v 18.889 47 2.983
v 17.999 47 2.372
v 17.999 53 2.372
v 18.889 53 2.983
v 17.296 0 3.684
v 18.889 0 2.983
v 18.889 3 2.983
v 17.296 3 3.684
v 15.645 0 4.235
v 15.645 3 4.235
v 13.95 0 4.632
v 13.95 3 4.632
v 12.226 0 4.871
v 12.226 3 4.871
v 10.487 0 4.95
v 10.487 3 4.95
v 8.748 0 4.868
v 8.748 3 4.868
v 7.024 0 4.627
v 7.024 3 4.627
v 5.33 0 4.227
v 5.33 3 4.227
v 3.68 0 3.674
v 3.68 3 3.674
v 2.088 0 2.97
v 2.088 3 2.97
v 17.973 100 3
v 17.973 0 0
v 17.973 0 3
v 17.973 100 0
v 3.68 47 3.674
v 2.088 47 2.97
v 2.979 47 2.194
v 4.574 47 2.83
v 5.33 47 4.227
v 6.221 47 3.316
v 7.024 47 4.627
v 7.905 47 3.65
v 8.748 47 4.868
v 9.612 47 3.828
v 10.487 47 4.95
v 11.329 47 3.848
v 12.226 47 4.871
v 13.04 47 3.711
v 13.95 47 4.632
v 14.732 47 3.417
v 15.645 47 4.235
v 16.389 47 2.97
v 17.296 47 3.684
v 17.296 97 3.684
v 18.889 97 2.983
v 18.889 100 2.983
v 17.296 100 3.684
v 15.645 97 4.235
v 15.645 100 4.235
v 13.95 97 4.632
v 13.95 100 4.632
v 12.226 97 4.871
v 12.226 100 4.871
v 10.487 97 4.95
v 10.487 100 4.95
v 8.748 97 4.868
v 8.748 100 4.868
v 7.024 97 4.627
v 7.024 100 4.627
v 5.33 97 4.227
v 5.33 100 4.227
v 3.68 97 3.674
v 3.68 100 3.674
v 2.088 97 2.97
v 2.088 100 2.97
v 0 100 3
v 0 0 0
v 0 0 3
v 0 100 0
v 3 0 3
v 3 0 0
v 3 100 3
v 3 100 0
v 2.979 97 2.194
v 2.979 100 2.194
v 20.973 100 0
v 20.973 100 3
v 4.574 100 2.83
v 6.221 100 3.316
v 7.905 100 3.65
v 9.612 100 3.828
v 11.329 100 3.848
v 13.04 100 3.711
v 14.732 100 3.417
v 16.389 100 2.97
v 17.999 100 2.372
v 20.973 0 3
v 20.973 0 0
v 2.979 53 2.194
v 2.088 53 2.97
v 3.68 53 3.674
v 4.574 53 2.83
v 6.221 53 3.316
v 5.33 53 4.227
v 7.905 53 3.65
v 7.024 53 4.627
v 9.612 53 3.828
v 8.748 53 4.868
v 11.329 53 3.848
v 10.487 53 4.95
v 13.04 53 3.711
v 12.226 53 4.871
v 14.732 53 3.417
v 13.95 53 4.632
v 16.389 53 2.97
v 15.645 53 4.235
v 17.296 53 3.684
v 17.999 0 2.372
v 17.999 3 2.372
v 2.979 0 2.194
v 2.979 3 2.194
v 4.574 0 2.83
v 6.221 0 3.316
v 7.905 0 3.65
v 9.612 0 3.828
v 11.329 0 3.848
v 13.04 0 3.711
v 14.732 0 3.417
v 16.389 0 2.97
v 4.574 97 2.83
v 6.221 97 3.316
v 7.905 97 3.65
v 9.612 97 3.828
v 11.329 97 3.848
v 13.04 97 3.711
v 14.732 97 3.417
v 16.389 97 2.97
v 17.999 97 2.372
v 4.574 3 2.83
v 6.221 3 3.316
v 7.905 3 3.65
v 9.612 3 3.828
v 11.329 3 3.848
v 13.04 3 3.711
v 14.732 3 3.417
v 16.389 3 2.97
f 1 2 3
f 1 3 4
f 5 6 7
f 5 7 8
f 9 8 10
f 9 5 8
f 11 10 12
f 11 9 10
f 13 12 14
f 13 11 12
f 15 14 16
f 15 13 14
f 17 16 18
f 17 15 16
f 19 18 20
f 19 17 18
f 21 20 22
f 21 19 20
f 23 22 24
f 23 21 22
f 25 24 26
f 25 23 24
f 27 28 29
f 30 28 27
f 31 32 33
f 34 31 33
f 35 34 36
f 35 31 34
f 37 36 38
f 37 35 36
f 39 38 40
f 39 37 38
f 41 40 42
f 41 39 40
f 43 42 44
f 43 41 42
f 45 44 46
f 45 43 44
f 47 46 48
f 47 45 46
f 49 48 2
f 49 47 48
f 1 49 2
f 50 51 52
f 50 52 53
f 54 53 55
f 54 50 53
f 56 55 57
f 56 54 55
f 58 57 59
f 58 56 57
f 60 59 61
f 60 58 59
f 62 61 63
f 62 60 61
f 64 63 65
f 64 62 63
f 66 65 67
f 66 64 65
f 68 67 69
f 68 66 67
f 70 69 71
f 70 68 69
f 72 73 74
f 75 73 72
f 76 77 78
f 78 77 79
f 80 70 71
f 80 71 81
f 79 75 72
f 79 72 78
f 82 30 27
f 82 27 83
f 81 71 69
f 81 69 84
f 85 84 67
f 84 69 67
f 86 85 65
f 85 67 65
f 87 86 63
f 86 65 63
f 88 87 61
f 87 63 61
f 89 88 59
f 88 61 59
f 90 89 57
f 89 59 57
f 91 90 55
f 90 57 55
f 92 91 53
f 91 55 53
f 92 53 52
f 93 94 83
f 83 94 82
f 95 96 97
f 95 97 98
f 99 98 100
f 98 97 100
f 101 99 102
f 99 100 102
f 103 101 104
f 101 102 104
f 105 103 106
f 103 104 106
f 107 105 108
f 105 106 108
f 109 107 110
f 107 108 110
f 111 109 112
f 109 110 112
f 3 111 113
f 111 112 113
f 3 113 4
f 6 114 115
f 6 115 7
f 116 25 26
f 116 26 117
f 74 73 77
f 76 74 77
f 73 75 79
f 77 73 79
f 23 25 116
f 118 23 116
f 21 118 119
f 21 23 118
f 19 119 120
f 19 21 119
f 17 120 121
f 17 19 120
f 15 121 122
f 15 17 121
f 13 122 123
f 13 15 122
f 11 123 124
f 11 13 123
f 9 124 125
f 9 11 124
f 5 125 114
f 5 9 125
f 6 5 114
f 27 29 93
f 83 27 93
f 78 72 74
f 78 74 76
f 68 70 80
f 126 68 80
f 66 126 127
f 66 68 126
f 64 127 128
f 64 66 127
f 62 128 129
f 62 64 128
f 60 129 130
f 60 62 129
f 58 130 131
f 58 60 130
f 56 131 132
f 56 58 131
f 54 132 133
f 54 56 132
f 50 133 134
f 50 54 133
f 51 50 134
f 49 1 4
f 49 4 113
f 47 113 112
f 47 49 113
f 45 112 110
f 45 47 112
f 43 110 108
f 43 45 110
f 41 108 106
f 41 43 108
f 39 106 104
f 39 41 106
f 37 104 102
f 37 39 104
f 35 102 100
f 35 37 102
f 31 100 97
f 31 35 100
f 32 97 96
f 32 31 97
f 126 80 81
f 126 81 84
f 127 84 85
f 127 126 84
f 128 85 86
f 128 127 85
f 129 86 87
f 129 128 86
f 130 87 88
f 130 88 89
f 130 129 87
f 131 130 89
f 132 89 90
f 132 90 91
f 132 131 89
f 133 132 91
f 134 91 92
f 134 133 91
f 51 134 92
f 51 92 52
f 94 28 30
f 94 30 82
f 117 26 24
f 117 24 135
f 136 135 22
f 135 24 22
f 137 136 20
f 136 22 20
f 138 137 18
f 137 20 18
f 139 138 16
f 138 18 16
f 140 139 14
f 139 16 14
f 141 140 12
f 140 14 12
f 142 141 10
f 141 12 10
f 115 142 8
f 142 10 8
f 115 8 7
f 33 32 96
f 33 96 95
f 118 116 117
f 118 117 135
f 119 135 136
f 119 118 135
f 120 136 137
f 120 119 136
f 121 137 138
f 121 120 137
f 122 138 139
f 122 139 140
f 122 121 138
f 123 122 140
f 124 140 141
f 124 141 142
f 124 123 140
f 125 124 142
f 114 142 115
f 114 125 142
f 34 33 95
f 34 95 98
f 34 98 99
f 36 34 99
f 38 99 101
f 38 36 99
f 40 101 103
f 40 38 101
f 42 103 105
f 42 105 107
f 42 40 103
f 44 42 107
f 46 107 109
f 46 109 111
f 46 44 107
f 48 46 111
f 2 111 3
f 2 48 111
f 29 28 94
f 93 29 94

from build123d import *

# Parameters (mm, degrees)
F0_W     = 3
F0_H     = 100
F1_DEPTH = 3
F3_DEPTH = 3
F4_START = -47
F4_DEPTH = 6
F5_START = -97
F5_DEPTH = 3


with BuildPart() as f1:
    # F0 (on Top) → F1 (new body)
    with BuildSketch(Plane.XY):
        with Locations((1.5, 50)):
            Rectangle(F0_W, F0_H)
    extrude(amount=F1_DEPTH)


with BuildPart() as f1b:
    # F0 (on Top) → F1, piece 2 (new body)
    with BuildSketch(Plane.XY):
        with Locations((19.4732441902, 50)):
            Rectangle(F0_W, F0_H)
    extrude(amount=F1_DEPTH)


with BuildPart() as f3:
    # F2 (on Front) → F3 (new body)
    with BuildSketch(Plane.XZ):
        with BuildLine():
            ThreePointArc((2.9794946313, 2.1942069288), (10.4704971824, 3.8575045035), (17.9987903684, 2.37208209))
            Line((17.9987903684, 2.37208209), (18.889406696, 2.9833931476))
            ThreePointArc((18.889406696, 2.9833931476), (10.4870498812, 4.9495737182), (2.087746514, 2.970389789))
            Line((2.087746514, 2.970389789), (2.9794946313, 2.1942069288))
        make_face()
    extrude(amount=-F3_DEPTH)


with BuildPart() as f4:
    # F2 (on Front) → F4 (new body)
    with BuildSketch(Plane.XZ.offset(F4_START)):
        with BuildLine():
            ThreePointArc((2.9794946313, 2.1942069288), (10.4704971824, 3.8575045035), (17.9987903684, 2.37208209))
            Line((17.9987903684, 2.37208209), (18.889406696, 2.9833931476))
            ThreePointArc((18.889406696, 2.9833931476), (10.4870498812, 4.9495737182), (2.087746514, 2.970389789))
            Line((2.087746514, 2.970389789), (2.9794946313, 2.1942069288))
        make_face()
    extrude(amount=-F4_DEPTH)


with BuildPart() as f5:
    # F2 (on Front) → F5 (new body)
    with BuildSketch(Plane.XZ.offset(F5_START)):
        with BuildLine():
            ThreePointArc((2.9794946313, 2.1942069288), (10.4704971824, 3.8575045035), (17.9987903684, 2.37208209))
            Line((17.9987903684, 2.37208209), (18.889406696, 2.9833931476))
            ThreePointArc((18.889406696, 2.9833931476), (10.4870498812, 4.9495737182), (2.087746514, 2.970389789))
            Line((2.087746514, 2.970389789), (2.9794946313, 2.1942069288))
        make_face()
    extrude(amount=-F5_DEPTH)


solid = Compound([f1.part, f1b.part, f3.part, f4.part, f5.part])
